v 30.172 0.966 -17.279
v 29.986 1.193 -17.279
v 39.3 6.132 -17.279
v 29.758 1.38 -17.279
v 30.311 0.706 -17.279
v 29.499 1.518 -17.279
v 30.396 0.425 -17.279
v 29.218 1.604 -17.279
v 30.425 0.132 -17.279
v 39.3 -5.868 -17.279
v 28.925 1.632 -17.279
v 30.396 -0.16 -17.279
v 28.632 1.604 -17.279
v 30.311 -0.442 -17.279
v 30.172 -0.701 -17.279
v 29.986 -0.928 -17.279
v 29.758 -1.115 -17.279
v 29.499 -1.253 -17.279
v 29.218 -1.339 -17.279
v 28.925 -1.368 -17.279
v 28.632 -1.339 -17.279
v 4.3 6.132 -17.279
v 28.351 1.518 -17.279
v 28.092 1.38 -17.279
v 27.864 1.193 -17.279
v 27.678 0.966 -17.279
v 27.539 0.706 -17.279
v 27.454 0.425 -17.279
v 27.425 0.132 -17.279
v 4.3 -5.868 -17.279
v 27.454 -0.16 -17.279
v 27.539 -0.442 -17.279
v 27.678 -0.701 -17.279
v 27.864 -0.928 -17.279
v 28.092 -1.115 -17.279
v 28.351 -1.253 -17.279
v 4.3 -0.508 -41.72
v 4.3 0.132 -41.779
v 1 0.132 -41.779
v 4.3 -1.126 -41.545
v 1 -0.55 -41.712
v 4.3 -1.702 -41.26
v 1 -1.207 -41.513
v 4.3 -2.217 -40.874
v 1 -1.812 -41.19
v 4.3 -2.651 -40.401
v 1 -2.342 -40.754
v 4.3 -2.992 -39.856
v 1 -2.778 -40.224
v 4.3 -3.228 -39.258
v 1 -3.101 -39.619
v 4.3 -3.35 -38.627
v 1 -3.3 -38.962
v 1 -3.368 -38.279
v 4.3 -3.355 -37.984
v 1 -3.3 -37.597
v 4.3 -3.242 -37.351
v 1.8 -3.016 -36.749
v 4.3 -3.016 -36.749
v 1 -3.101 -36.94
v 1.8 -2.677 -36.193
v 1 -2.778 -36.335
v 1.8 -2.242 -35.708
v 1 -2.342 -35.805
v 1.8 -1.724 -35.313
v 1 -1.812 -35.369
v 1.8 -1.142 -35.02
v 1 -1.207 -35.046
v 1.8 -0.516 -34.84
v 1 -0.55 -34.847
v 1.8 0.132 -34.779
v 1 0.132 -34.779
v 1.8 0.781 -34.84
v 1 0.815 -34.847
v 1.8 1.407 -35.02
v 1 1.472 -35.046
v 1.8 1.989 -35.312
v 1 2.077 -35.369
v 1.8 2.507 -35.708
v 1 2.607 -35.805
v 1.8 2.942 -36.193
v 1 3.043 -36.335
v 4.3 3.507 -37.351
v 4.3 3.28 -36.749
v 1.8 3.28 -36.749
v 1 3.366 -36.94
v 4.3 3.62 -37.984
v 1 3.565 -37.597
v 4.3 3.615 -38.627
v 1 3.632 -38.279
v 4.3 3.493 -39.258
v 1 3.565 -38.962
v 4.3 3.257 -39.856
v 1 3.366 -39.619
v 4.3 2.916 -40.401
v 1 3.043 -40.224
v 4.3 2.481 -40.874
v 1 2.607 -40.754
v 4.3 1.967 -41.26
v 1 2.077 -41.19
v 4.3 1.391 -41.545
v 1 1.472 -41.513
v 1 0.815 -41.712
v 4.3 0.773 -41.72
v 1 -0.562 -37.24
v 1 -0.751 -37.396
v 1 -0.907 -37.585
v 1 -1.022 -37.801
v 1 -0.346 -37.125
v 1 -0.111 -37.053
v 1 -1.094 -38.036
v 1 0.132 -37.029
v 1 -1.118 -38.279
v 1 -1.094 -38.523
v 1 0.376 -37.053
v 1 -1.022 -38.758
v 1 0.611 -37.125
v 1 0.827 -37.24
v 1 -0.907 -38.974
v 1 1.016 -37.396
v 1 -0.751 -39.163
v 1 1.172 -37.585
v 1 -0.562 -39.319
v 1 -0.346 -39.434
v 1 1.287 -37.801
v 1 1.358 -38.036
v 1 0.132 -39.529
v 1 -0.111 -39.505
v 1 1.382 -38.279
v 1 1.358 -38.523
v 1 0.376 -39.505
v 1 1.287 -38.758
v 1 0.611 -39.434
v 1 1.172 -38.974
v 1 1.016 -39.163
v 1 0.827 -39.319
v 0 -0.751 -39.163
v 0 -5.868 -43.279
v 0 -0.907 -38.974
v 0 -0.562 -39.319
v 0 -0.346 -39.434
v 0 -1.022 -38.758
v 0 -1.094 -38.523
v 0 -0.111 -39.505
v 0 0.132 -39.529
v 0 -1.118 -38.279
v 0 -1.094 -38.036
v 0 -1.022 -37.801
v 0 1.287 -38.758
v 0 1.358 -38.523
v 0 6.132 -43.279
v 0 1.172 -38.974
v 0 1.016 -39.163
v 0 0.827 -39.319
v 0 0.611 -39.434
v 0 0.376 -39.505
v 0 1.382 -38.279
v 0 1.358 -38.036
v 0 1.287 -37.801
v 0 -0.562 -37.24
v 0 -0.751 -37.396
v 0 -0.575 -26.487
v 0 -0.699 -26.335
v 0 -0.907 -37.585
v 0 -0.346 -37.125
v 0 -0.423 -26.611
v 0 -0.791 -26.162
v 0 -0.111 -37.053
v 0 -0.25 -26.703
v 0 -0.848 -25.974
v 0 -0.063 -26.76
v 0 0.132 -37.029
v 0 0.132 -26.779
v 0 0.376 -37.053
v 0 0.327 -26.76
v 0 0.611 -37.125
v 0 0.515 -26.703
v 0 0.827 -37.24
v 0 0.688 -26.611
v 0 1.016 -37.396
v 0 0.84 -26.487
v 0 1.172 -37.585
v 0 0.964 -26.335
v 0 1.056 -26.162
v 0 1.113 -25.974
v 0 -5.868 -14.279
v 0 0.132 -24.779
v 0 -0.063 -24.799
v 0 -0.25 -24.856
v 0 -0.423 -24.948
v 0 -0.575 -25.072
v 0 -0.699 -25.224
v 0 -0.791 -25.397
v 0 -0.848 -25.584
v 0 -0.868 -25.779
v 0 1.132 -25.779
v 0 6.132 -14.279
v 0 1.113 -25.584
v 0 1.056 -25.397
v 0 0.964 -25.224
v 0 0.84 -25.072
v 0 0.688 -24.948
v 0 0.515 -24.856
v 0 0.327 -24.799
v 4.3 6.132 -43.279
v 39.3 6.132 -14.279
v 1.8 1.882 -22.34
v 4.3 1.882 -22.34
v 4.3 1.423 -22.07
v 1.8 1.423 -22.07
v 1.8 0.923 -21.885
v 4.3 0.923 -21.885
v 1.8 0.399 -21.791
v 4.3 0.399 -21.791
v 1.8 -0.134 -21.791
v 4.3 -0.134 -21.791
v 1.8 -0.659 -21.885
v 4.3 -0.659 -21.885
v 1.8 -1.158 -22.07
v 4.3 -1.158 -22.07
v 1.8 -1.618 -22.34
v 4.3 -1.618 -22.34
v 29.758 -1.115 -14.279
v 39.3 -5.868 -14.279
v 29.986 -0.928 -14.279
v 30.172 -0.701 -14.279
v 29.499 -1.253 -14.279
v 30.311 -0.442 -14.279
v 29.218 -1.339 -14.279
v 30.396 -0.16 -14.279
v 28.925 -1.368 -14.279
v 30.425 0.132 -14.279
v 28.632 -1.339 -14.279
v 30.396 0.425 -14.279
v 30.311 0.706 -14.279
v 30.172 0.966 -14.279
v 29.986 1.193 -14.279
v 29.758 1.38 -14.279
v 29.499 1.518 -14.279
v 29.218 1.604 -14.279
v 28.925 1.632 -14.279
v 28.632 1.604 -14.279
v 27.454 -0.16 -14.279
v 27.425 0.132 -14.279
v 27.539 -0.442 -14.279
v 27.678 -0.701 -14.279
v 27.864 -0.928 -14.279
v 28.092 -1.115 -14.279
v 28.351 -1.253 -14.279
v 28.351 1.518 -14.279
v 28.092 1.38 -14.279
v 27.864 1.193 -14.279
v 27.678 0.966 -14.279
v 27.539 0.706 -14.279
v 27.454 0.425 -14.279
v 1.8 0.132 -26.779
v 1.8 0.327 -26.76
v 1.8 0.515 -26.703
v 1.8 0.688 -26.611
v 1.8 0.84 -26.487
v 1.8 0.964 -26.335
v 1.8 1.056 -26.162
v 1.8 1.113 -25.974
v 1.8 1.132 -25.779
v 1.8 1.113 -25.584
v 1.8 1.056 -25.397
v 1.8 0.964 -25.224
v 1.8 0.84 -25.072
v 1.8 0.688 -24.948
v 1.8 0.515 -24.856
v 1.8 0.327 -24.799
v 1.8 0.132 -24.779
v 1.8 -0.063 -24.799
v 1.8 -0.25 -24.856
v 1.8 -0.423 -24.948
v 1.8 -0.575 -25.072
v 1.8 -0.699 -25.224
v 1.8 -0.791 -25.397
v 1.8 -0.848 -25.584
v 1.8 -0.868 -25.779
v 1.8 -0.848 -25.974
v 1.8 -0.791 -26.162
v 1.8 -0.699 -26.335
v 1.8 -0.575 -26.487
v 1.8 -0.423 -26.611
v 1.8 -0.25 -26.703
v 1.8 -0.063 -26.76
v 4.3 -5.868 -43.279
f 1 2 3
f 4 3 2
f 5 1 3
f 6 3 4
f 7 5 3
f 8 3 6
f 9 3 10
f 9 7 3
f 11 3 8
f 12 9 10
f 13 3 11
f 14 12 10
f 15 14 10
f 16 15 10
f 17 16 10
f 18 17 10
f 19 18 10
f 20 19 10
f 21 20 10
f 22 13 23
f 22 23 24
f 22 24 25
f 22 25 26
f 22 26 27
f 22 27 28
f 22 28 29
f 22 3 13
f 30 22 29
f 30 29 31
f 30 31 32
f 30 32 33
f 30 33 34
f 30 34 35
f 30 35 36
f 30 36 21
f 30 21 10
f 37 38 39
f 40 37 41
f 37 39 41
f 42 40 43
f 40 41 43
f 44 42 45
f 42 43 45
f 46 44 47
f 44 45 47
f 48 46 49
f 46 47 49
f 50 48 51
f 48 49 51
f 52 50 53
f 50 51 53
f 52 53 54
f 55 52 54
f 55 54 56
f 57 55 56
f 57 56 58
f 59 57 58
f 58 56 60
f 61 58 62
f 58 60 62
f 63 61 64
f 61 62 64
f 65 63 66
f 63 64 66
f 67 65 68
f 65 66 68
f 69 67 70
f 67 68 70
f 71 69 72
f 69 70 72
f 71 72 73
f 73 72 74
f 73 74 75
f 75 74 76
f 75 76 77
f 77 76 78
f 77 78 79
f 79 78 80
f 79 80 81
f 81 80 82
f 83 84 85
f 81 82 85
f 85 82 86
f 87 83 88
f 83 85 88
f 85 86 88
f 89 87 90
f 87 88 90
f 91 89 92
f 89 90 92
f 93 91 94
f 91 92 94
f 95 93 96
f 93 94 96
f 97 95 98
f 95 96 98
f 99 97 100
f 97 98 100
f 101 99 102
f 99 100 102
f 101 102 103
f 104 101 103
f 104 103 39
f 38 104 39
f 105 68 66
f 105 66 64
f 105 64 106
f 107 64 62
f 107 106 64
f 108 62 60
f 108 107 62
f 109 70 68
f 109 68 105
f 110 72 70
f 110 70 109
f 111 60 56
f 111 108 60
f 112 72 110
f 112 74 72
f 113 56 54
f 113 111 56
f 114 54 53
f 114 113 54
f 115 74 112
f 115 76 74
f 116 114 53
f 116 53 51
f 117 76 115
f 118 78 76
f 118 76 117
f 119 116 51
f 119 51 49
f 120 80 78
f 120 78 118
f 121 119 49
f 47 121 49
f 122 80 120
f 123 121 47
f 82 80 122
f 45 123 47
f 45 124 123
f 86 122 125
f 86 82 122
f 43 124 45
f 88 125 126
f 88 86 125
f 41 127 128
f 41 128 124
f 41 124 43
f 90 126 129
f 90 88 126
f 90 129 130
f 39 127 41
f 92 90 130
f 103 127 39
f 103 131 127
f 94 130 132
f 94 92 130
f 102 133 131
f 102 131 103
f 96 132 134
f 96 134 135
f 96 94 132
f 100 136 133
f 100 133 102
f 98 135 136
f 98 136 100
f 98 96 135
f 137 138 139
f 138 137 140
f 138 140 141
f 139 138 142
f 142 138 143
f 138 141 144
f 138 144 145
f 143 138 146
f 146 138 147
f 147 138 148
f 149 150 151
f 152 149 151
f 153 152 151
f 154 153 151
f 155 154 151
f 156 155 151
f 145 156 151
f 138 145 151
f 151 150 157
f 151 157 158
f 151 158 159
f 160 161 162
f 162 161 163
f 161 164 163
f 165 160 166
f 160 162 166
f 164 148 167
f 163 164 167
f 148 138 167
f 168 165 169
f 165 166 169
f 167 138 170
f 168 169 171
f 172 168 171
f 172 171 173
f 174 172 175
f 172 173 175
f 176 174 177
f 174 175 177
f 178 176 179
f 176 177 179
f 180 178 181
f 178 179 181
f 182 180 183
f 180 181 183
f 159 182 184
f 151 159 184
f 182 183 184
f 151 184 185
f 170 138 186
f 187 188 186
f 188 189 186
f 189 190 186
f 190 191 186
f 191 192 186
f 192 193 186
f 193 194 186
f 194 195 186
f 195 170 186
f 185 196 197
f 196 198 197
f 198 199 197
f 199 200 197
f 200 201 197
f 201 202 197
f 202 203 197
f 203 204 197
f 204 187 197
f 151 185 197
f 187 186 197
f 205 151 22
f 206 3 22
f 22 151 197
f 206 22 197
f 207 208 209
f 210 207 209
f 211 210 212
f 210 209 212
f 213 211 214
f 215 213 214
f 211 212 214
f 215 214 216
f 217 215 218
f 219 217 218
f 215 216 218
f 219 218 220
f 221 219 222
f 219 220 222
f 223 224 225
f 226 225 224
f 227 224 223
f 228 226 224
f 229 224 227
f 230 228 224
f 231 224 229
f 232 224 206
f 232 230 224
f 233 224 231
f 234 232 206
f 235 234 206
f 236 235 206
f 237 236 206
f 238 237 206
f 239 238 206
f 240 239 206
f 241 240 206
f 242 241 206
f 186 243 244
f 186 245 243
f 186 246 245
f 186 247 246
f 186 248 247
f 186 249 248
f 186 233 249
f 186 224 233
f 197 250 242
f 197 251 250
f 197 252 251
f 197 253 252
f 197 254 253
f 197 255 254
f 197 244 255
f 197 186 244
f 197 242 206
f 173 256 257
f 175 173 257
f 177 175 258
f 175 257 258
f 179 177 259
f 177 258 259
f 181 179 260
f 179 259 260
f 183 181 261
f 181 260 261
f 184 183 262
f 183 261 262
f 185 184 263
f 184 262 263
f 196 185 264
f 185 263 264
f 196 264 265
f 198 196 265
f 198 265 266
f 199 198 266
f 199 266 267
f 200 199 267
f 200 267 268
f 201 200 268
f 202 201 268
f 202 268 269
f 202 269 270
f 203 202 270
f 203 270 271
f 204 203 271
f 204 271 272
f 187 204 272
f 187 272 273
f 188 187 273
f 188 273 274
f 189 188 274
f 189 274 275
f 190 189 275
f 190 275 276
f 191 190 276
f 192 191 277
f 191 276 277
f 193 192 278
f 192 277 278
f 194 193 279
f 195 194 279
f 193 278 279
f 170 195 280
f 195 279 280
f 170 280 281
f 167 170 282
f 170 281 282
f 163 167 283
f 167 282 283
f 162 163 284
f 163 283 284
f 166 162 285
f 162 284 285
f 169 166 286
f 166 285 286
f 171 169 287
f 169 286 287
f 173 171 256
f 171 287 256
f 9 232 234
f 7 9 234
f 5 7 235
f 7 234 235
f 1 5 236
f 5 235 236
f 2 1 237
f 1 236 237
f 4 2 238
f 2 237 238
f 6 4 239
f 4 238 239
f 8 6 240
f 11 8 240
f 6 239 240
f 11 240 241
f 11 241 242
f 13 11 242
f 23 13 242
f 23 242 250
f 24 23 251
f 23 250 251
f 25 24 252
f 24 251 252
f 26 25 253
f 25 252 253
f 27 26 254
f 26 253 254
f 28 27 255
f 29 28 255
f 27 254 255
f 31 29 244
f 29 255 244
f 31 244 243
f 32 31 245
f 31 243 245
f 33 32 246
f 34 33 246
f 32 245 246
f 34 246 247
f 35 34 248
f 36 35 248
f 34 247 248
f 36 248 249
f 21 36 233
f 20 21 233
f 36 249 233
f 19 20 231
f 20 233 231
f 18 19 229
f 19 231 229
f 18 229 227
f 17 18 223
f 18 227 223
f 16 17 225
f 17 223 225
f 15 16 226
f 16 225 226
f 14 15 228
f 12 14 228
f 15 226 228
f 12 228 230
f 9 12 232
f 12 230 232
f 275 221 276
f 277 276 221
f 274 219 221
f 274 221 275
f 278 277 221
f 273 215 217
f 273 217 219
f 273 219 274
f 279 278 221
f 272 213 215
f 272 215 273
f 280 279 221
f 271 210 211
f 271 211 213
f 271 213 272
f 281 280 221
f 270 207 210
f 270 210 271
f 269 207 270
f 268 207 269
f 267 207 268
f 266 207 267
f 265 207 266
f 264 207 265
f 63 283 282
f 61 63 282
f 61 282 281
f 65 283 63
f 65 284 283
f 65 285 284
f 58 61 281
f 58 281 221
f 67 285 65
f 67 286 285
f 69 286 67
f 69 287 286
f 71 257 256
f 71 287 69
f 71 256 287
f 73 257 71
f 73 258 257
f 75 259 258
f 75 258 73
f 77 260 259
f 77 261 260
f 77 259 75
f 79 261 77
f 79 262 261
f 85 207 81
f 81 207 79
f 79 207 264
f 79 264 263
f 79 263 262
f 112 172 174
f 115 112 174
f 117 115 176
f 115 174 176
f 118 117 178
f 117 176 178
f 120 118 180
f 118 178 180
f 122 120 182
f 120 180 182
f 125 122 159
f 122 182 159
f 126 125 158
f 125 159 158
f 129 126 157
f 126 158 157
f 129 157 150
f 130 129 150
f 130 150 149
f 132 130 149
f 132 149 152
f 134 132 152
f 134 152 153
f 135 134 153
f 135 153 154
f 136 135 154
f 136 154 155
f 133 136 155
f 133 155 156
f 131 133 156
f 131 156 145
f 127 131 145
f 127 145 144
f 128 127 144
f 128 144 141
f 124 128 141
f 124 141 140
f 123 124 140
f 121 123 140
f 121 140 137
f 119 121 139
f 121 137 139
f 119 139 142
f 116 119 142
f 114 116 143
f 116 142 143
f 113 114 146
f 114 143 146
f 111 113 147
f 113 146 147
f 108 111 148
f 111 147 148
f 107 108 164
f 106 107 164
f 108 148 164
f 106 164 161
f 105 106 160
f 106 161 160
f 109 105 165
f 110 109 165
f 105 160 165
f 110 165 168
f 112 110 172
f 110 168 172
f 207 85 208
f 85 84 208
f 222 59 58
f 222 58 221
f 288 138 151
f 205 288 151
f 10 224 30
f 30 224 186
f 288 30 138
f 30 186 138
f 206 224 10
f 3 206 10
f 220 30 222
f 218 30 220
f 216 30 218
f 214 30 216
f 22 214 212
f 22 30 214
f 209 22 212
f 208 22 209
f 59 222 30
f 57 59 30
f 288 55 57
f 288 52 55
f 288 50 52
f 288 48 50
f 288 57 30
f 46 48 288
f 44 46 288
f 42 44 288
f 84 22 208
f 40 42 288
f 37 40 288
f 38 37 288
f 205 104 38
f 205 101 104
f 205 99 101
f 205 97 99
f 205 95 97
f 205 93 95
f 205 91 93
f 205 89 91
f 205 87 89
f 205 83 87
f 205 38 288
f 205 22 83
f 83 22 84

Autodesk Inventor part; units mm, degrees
ref_plane "YZ Plane" through (0, 0, 0) normal (1, 0, 0) x (0, 1, 0)
ref_plane "XZ Plane" through (0, 0, 0) normal (0, 1, 0) x (-1, 0, 0)
ref_plane "XY Plane" through (0, 0, 0) normal (0, 0, 1) x (1, 0, 0)
sketch "Sketch1" plane through (0, 0, 0) normal (1, 0, 0) x (0, 1, 0)
  line L0 (6.1324, -14.2794) -> (-5.8676, -14.2794)
  line L1 (-5.8676, -14.2794) -> (-5.8676, -43.2794)
  line L2 (-5.8676, -43.2794) -> (6.1324, -43.2794)
  line L3 (6.1324, -43.2794) -> (6.1324, -14.2794)
  point P0 (0, 0)
  dimension "d0" = 12
  dimension "d1" = 29
extrude "Extrusion1" add sketch "Sketch1" along normal blind 1.8
sketch "Sketch2" plane through (1.8, 0, 0) normal (1, 0, 0) x (0, 0, -1)
  circle A0 centre (38.2794, 0.1324) radius 3.5
  line L0 (43.2794, -5.8676) -> (43.2794, 6.1324) projected
  line L1 (14.2794, -5.8676) -> (43.2794, -5.8676) projected
  point P0 (0, 0)
  dimension "d4" = 7
  dimension "d5" = 5
  dimension "d6" = 6
extrude "Extrusion2" cut sketch "Sketch2" against normal blind 0.8
sketch "Sketch3" plane through (1.8, 0, 0) normal (1, 0, 0) x (0, 0, -1)
  line L0 (14.2794, 6.1324) -> (14.2794, -5.8676) projected
  line L1 (43.2794, -5.8676) -> (43.2794, 6.1324) projected
  line L2 (14.2794, 6.1324) -> (43.2794, 6.1324)
  line L3 (43.2794, 6.1324) -> (43.2794, -5.8676)
  line L4 (43.2794, -5.8676) -> (14.2794, -5.8676)
  line L5 (14.2794, -5.8676) -> (14.2794, 6.1324)
  circle A0 centre (38.2794, 0.1324) radius 3.5 projected
  circle A1 centre (38.2794, 0.1324) radius 3.5
  point P0 (0, 0)
  point P1 (43.2794, 6.1324)
  point P2 (14.2794, -5.8676)
extrude "Extrusion3" add sketch "Sketch3" along normal blind 2.5
sketch "Sketch4" plane through (4.3, 0, 0) normal (1, 0, 0) x (0, 0, -1)
  circle A0 centre (38.2794, 0.1324) radius 3.5 projected
  line L0 (36.7494, 3.2802) -> (22.3405, 1.8824)
  line L1 (36.7494, -3.0155) -> (22.3405, -1.6176)
  arc A1 (22.3405, 1.8824) -> (22.3405, -1.6176) centre (24.7889, 0.1324) ccw
  line L2 (43.2794, 6.1324) -> (14.2794, 6.1324) projected
  point P0 (0, 0)
  point P1 (21.7794, 0.1324)
  dimension "d15" = 1.53
  dimension "d16" = 1.53
  dimension "d17" = 16.5
  dimension "d18" = 3.5
  dimension "d19" = 6
extrude "Extrusion4" cut sketch "Sketch4" against normal blind 2.5 contours A0 L1 A1 L0
sketch "Sketch5" plane through (0, 0, 0) normal (-1, 0, 0) x (0, 0, 1)
  circle A0 centre (-38.2794, 0.1324) radius 3.5 projected
  circle A1 centre (-38.2794, 0.1324) radius 1.25
  point P0 (0, 0)
  dimension "d22" = 2.5
extrude "Extrusion5" cut sketch "Sketch5" against normal blind 2.5 contours A1
sketch "Sketch6" plane through (4.3, 0, 0) normal (1, 0, 0) x (0, 0, -1)
  line L0 (43.2794, 6.1324) -> (14.2794, 6.1324) projected
  line L1 (14.2794, -5.8676) -> (43.2794, -5.8676) projected
  line L2 (14.2794, 6.1324) -> (17.2794, 6.1324)
  line L3 (17.2794, 6.1324) -> (17.2794, -5.8676)
  line L4 (17.2794, -5.8676) -> (14.2794, -5.8676)
  line L5 (14.2794, -5.8676) -> (14.2794, 6.1324)
  point P0 (0, 0)
  point P1 (14.2794, -5.8676)
  point P2 (17.2794, 6.1324)
  dimension "d25" = 3
extrude "Extrusion6" add sketch "Sketch6" along normal blind 35
sketch "Sketch7" plane through (0, -5.8676, -14.2794) normal (0, 0, 1) x (1, 0, 0)
  circle A0 centre (28.925, 6) radius 1.5
  line L0 (39.3, 12) -> (39.3, 0) projected
  line L1 (0, 12) -> (39.3, 12) projected
  line L2 (0, 12) -> (0, 0) projected
  point P0 (0, 5.8676)
  dimension "d28" = 3
  dimension "d30" = 6
  dimension "d38" = 28.925
extrude "Extrusion7" cut sketch "Sketch7" against normal blind 40
sketch "Sketch8" plane through (1.8, 0, 0) normal (1, 0, 0) x (0, 0, -1)
  circle A0 centre (25.7794, 0.1324) radius 1
  circle A1 centre (38.2794, 0.1324) radius 1.25 projected
  point P0 (0, 0)
  dimension "d33" = 2
  dimension "d34" = 12.5
  dimension "d35" = 0
extrude "Extrusion8" cut sketch "Sketch8" against normal blind 10 contours A0
properties part number "18_2"
